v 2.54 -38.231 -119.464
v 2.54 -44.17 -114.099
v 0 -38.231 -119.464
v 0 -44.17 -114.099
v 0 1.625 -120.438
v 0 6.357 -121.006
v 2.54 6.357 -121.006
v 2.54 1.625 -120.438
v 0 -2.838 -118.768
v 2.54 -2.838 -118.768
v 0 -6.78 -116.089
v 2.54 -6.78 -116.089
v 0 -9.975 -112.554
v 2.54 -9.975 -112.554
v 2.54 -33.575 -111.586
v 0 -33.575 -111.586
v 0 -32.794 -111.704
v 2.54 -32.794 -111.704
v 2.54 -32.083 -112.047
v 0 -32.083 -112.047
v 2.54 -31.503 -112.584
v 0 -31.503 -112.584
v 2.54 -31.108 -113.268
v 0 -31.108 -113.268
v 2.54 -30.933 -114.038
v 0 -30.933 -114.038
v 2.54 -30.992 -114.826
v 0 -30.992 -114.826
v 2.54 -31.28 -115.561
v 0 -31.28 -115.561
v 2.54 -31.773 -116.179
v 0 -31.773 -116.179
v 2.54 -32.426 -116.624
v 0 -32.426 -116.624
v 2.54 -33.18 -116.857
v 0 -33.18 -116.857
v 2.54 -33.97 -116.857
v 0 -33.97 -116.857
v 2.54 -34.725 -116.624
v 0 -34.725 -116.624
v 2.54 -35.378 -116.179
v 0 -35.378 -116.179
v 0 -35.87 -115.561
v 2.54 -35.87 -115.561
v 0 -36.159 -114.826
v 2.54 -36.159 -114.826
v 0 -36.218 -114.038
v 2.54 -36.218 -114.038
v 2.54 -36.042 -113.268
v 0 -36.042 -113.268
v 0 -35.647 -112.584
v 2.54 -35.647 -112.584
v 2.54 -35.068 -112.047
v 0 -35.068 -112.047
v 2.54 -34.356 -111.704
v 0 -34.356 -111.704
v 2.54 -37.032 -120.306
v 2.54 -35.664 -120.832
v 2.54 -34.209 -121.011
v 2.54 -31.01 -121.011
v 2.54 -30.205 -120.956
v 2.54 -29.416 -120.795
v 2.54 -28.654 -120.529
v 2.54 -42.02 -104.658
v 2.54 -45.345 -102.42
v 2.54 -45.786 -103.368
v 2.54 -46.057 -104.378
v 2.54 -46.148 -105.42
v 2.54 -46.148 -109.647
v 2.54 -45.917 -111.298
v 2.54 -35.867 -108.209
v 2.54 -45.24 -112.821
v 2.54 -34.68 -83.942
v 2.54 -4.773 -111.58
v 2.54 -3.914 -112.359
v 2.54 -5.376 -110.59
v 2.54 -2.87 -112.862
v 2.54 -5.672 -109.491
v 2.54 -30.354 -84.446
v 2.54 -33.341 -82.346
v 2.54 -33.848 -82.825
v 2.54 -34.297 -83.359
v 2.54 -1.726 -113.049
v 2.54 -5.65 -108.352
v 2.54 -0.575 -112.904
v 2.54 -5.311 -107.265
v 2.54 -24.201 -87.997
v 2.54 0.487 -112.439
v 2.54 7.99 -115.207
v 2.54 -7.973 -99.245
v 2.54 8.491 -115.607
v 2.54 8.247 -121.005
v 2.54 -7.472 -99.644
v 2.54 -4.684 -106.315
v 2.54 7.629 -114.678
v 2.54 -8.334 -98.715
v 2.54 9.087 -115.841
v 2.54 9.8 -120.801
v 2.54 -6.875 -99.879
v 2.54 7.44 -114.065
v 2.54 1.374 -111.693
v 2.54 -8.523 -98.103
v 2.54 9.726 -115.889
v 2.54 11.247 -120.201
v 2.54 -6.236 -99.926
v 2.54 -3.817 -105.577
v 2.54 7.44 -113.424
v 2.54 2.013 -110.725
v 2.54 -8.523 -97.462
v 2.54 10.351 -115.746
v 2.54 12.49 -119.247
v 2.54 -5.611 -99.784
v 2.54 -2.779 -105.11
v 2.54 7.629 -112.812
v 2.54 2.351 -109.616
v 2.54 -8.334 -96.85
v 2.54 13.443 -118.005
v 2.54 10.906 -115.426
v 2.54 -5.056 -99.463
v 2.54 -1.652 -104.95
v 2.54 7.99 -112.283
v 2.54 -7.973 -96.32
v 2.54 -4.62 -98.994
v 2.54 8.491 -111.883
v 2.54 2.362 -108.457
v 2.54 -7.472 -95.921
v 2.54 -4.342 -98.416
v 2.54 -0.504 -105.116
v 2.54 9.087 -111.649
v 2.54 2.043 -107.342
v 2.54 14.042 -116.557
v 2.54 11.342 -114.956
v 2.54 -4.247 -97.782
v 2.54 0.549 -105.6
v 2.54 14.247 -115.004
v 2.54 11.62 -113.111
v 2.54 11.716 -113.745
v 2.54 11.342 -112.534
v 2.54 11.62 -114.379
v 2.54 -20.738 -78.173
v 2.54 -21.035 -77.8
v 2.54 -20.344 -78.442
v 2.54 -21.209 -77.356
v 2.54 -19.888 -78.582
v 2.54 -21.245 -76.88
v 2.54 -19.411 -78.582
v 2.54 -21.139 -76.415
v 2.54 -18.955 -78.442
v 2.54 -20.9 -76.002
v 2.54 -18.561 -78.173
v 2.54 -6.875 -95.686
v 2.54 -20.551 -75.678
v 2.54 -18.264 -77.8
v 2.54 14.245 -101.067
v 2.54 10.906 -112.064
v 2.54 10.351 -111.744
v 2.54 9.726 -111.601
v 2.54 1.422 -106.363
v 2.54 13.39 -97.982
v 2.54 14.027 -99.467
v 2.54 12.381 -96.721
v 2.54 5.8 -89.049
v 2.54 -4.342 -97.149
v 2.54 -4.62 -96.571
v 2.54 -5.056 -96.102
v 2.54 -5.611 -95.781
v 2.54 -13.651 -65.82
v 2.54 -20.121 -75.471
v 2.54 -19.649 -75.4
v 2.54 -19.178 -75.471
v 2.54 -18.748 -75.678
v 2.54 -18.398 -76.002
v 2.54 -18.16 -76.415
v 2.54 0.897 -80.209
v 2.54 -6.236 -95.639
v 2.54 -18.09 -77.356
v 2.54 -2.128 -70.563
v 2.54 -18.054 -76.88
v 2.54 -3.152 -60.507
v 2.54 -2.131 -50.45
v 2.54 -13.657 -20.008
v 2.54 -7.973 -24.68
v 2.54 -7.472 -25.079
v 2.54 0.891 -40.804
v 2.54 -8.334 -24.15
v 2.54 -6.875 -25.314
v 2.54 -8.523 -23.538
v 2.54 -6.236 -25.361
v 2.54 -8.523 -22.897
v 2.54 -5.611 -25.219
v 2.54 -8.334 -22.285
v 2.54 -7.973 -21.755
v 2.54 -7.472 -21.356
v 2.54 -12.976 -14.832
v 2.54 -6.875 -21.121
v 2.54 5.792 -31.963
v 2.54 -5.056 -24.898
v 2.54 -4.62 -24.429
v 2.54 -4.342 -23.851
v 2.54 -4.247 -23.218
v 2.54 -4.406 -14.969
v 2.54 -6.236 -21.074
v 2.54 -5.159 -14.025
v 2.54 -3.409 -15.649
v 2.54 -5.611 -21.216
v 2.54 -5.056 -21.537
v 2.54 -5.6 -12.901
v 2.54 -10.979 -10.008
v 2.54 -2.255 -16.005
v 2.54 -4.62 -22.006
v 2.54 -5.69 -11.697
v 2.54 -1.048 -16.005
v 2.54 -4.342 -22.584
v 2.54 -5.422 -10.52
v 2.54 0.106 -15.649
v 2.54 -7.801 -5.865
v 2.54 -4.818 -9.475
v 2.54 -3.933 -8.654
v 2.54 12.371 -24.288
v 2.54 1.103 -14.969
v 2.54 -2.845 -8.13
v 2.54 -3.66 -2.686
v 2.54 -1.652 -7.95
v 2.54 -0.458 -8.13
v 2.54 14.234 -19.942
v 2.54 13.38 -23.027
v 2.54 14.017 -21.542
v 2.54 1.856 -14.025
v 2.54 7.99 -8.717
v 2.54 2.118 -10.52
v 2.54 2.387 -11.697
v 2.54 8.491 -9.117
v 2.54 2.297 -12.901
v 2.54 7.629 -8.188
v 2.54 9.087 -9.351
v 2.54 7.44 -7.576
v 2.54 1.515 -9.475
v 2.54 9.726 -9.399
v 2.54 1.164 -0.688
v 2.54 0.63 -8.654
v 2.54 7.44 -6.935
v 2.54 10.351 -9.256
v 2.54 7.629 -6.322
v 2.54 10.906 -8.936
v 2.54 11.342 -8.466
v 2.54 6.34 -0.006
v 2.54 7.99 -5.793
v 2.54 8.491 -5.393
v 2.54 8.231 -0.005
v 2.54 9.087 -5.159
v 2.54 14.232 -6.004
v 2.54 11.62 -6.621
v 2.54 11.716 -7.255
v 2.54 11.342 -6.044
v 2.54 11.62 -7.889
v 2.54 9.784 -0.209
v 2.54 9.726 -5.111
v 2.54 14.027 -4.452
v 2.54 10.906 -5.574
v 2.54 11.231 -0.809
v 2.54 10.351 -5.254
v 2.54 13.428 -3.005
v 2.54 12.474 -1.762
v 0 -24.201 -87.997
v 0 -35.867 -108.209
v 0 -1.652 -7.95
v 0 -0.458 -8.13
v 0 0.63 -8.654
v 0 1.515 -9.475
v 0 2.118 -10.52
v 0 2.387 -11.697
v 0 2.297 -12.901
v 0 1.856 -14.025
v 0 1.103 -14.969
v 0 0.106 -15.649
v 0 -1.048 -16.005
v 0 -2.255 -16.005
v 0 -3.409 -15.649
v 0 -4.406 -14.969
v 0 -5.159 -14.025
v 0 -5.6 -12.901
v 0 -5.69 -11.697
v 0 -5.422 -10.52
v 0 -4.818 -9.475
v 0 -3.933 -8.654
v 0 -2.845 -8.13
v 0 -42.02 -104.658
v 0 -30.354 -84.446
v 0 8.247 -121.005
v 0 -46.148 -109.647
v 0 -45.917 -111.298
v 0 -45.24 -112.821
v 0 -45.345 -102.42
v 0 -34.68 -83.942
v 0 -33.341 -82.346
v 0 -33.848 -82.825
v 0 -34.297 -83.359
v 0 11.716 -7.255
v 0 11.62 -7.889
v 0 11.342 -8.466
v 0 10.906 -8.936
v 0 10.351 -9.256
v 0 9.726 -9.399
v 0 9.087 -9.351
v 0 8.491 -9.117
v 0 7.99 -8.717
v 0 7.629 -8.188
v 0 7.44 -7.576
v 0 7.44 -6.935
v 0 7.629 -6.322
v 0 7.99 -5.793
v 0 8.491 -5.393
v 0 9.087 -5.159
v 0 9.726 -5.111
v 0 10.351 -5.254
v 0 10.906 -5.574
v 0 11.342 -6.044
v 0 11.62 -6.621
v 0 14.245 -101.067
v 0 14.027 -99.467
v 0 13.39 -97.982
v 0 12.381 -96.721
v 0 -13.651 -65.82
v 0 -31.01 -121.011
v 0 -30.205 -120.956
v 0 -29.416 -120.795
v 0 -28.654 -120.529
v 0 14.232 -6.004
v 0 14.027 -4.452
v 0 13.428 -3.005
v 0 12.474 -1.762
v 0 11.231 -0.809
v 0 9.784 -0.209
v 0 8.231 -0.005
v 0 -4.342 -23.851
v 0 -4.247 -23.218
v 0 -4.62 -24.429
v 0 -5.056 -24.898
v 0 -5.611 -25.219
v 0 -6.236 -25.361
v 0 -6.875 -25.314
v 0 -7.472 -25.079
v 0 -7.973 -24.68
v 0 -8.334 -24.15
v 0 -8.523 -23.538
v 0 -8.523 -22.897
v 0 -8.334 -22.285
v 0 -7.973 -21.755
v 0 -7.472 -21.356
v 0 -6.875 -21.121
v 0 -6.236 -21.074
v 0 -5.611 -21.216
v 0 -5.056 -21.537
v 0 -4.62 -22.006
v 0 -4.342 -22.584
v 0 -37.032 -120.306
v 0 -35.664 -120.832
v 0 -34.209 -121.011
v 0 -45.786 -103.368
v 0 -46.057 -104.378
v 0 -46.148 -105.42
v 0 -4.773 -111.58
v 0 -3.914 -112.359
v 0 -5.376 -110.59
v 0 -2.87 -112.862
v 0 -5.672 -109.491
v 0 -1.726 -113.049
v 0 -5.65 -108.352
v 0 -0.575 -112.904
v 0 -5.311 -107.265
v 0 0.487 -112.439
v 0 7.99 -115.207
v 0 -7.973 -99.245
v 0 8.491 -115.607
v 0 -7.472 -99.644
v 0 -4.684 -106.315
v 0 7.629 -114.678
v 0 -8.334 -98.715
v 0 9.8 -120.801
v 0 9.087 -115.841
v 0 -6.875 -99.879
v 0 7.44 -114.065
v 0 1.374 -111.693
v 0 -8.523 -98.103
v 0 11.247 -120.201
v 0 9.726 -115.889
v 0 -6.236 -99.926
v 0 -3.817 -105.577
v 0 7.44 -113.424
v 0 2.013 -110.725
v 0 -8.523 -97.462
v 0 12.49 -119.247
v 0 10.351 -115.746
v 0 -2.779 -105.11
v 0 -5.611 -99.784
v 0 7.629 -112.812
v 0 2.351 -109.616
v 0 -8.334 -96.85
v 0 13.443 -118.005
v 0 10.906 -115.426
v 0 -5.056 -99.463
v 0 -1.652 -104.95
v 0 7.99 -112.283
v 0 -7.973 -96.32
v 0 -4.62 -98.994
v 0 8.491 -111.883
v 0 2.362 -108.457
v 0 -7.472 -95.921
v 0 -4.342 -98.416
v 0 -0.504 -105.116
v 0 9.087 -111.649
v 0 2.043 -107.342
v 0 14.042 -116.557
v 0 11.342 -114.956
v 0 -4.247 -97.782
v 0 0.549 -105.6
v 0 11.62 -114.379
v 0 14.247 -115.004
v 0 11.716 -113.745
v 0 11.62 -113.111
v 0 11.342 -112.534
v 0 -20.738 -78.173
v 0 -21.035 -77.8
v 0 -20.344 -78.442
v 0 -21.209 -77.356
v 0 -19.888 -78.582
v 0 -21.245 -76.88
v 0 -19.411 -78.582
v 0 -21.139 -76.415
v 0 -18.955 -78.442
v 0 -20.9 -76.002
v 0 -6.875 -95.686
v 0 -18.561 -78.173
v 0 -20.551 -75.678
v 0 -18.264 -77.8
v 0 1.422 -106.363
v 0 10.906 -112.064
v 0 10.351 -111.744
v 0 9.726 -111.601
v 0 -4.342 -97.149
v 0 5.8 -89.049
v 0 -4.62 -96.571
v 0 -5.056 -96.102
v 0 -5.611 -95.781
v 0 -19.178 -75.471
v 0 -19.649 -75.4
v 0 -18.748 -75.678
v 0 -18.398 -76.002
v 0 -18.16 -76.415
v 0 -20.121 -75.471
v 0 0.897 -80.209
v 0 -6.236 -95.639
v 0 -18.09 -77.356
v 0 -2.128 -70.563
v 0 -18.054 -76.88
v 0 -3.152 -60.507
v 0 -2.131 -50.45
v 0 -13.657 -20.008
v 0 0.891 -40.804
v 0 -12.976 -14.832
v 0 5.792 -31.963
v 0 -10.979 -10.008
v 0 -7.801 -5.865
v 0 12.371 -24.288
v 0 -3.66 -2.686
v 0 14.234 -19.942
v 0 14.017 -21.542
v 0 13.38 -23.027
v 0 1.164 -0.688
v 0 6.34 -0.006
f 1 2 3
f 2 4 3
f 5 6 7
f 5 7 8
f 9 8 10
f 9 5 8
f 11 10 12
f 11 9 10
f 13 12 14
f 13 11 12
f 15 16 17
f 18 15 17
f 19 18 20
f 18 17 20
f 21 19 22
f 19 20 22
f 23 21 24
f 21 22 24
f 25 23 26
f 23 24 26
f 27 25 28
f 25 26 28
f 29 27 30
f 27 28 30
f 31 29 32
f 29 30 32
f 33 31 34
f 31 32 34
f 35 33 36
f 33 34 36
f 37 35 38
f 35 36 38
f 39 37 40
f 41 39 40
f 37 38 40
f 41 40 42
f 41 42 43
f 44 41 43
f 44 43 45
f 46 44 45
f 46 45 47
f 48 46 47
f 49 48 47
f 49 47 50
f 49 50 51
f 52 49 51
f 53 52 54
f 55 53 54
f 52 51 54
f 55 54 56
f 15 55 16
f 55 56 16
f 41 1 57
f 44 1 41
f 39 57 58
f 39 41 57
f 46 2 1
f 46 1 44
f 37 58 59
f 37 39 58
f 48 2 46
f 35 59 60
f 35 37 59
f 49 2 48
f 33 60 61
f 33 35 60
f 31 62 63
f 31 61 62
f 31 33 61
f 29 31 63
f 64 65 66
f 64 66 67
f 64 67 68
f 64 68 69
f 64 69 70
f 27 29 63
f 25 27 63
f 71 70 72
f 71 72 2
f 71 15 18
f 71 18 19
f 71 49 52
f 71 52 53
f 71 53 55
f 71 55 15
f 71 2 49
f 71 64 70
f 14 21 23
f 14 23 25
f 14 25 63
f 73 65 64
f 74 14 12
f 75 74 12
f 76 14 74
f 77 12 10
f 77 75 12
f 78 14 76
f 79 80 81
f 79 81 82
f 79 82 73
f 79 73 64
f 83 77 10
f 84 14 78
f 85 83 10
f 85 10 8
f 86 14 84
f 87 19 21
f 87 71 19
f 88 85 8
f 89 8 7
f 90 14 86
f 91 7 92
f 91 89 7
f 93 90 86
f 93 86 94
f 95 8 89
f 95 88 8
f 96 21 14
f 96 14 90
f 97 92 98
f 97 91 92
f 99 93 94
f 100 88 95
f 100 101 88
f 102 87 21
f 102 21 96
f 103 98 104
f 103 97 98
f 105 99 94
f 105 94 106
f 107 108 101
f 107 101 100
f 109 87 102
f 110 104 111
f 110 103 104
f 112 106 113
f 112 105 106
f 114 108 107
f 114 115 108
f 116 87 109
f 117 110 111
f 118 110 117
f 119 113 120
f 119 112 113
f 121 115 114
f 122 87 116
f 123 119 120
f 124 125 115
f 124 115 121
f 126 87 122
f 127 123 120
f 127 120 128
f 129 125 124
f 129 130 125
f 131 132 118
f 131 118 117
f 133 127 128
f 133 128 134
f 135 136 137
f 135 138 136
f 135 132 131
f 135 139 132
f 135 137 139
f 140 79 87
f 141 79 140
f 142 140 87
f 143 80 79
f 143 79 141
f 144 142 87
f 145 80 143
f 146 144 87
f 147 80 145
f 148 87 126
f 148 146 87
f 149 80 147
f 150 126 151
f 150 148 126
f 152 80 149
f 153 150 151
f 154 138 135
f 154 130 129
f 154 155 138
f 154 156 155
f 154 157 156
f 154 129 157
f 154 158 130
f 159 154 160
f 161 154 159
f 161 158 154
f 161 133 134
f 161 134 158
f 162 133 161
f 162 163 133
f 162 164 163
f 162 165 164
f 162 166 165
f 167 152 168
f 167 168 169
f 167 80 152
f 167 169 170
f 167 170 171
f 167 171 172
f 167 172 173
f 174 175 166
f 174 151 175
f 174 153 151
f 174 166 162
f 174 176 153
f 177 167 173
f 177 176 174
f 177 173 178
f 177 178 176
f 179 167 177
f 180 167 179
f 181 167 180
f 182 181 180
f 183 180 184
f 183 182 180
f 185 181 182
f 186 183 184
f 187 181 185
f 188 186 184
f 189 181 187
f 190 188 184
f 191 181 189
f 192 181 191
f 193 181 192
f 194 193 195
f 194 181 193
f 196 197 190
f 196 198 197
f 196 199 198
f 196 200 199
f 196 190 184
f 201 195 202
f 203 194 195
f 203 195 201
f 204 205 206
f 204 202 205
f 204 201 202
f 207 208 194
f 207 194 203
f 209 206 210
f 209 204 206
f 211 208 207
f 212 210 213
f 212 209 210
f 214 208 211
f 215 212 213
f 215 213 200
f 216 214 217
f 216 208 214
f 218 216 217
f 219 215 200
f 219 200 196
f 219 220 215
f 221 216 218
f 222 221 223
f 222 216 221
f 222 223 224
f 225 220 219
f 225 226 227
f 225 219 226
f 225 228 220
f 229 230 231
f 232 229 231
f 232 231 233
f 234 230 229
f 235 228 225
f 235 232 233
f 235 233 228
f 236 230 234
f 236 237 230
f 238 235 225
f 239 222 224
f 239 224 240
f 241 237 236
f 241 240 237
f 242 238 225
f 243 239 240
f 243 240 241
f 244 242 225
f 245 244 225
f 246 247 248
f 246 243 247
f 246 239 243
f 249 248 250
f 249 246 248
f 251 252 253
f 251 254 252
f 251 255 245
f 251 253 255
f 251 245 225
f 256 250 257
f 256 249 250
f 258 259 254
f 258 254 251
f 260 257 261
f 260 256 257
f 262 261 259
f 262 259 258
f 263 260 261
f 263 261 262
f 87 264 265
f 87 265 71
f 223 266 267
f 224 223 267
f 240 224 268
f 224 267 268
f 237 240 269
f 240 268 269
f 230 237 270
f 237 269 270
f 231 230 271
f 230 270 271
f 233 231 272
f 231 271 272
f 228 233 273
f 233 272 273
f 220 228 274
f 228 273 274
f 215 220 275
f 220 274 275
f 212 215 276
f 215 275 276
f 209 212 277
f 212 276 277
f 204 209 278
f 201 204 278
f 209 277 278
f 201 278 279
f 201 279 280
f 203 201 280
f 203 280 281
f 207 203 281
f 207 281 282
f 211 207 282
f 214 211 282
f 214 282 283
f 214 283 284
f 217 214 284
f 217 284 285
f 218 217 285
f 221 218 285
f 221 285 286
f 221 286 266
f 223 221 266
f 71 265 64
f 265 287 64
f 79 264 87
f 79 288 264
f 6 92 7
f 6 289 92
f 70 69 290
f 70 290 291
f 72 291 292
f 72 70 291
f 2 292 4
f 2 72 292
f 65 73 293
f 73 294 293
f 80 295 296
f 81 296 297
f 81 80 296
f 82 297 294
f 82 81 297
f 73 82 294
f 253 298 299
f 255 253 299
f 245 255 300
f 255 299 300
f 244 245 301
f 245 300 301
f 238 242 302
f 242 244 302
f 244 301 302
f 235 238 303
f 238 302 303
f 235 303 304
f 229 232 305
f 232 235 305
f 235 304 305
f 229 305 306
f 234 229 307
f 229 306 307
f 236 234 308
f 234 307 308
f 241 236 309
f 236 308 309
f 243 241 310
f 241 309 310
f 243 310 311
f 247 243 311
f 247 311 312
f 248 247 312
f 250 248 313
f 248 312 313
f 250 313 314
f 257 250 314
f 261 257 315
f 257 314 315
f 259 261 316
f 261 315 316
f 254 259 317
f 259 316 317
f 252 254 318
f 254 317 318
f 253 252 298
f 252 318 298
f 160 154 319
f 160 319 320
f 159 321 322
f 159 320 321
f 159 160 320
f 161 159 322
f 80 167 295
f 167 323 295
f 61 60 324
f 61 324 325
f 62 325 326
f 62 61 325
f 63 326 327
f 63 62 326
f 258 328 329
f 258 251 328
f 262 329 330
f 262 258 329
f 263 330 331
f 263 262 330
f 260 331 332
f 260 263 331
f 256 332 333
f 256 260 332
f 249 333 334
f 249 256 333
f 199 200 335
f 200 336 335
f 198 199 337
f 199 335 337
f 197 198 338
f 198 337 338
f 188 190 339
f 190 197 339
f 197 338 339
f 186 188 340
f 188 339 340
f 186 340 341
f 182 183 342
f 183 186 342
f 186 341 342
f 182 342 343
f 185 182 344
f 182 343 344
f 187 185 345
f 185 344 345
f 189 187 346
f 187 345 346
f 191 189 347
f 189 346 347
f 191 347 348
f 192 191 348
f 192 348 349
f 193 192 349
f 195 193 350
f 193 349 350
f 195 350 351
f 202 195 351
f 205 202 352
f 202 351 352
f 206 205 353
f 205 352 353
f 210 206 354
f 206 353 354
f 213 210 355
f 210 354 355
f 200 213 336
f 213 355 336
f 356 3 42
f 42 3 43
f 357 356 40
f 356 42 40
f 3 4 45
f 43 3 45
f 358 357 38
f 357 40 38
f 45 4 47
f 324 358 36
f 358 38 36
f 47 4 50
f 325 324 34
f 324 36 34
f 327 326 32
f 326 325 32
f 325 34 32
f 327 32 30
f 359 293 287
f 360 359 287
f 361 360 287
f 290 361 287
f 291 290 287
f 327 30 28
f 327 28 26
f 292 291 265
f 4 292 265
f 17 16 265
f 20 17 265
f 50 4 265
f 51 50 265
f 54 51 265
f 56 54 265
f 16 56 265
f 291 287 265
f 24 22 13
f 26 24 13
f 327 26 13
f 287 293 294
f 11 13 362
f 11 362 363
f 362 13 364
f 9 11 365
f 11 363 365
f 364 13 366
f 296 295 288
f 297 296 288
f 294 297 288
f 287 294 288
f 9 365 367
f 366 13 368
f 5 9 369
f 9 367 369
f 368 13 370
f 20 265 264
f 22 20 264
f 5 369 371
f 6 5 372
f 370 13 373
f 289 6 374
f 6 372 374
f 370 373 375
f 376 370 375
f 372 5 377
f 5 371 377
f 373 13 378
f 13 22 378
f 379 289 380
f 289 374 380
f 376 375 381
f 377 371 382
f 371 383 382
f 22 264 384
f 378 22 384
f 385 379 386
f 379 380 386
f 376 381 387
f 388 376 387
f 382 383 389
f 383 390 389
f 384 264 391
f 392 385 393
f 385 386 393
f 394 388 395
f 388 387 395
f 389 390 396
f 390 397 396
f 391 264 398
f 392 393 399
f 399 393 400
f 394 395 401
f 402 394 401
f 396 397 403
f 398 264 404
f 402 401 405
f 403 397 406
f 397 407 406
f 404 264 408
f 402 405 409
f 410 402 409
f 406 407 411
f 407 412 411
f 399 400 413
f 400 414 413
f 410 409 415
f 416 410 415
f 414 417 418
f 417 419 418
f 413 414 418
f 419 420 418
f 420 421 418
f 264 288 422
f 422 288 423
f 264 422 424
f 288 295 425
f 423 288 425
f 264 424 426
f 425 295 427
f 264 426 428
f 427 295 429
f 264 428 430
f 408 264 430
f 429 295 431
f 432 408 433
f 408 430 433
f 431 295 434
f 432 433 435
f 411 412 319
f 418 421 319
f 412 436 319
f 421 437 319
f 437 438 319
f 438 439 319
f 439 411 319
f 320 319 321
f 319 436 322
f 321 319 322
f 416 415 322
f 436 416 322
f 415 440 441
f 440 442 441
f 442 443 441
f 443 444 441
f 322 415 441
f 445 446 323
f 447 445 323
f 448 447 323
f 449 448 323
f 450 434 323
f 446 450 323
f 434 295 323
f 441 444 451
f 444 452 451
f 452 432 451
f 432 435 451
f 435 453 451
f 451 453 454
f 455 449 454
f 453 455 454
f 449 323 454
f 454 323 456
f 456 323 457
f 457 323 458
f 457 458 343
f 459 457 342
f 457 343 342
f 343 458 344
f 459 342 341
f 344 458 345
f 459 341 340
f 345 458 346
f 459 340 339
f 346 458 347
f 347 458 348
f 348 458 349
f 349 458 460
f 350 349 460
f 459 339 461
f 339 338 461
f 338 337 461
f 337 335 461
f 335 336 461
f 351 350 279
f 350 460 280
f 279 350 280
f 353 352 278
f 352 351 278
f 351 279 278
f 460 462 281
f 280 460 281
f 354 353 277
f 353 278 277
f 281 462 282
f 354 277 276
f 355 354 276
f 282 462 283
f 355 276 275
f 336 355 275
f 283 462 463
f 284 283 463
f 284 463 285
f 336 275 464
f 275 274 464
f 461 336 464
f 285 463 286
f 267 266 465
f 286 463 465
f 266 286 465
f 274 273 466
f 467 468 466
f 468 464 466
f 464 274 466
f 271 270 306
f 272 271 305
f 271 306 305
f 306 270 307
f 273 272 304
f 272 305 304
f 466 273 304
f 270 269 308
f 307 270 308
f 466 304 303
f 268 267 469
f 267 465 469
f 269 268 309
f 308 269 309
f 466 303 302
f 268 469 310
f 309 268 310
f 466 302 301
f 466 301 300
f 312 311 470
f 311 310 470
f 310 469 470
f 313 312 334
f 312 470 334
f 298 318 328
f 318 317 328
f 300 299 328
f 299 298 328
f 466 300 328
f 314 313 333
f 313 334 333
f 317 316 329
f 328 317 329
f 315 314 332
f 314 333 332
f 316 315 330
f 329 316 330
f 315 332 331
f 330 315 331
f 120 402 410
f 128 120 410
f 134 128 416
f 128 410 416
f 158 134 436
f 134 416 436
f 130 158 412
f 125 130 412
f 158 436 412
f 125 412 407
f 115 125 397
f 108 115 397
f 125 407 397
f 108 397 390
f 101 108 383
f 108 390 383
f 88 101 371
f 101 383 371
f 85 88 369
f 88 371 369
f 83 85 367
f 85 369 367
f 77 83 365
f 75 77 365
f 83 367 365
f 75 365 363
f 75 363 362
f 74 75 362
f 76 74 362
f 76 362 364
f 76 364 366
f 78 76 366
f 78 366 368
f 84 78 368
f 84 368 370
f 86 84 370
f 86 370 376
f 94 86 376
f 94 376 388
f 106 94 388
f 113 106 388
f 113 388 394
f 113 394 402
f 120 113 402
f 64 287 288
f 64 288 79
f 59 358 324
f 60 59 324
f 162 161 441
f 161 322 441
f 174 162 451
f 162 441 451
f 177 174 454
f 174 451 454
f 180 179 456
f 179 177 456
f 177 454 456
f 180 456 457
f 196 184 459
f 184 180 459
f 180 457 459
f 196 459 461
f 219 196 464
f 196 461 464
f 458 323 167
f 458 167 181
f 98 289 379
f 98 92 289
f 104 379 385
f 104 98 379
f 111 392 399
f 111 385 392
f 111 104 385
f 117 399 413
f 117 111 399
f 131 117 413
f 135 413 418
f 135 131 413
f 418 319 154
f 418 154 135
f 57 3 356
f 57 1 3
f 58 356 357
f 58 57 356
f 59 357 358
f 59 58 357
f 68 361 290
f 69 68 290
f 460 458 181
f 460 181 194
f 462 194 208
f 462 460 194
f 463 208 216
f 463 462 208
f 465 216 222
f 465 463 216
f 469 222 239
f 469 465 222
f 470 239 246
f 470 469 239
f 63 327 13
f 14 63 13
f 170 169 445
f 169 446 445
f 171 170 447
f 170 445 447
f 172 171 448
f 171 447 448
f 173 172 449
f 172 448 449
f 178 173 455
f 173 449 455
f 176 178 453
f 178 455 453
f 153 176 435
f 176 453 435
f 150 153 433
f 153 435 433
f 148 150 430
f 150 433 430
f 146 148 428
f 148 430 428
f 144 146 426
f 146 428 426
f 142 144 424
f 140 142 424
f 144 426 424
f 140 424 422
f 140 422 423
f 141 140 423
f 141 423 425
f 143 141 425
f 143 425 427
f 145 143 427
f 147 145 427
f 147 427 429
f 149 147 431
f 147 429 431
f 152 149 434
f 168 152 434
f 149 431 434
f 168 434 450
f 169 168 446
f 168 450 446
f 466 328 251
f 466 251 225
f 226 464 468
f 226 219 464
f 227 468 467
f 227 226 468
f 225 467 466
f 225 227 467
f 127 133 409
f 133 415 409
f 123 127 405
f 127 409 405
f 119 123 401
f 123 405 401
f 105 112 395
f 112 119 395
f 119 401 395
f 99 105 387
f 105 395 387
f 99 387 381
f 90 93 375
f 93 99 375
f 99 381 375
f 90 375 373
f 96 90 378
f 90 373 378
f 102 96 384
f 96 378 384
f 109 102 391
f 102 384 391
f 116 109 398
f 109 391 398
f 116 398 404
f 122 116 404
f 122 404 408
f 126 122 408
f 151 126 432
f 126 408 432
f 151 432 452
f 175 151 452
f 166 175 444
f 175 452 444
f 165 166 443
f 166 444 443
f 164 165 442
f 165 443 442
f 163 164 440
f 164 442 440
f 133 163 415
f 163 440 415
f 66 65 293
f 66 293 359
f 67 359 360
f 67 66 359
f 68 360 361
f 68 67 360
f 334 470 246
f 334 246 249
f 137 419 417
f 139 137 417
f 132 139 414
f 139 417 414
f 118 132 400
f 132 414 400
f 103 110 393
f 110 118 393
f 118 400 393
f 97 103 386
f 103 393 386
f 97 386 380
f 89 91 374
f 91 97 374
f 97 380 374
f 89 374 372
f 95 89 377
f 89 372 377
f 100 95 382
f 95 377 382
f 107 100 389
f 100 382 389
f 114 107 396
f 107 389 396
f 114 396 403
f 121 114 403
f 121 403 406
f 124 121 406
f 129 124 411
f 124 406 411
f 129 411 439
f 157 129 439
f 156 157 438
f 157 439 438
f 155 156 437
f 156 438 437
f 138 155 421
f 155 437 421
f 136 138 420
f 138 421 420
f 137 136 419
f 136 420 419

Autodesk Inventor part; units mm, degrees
ref_plane "YZ Plane" through (0, 0, 0) normal (1, 0, 0) x (0, 1, 0)
ref_plane "XZ Plane" through (0, 0, 0) normal (0, 1, 0) x (-1, 0, 0)
sketch "Sketch1" plane through (0, 0, 0) normal (1, 0, 0) x (0, 1, 0)
  line L0 (14.231, -0.0045) -> (14.2475, -121.0044)
  circle A0 centre (46.8483, -60.5) radius 44 projected
  arc A1 (-10.6283, -58.8604) -> (-0.114, -93.6782) centre (46.8483, -60.5) ccw projected
  line L1 (-0.114, -93.6782) -> (2.9975, -94.9709) projected
  arc A2 (2.9975, -94.9709) -> (7.0992, -99.6298) centre (46.8483, -60.5) ccw projected
  line L2 (7.0992, -99.6298) -> (13.2859, -93.5395) projected
  arc A3 (-0.2275, -59.1156) -> (13.2859, -93.5395) centre (46.8483, -60.5) ccw projected
  line L3 (-0.2275, -59.1156) -> (-8.9052, -58.8604) projected
  line L4 (-8.9052, -58.8604) -> (-10.6283, -58.8604) projected
  circle A4 centre (84.1308, -7.2551) radius 2.15 projected
  circle A5 centre (95.3483, -109) radius 2.65 projected
  circle A6 centre (100.0932, -97.7825) radius 2.15 projected
  circle A7 centre (-6.3966, -23.2175) radius 2.15 projected
  circle A8 centre (-6.3966, -97.7825) radius 2.15 projected
  circle A9 centre (-1.6517, -12) radius 2.65 projected
  circle A10 centre (95.3483, -12) radius 2.65 projected
  circle A11 centre (9.5658, -113.7449) radius 2.15 projected
  circle A12 centre (9.5658, -7.2551) radius 2.15 projected
  circle A13 centre (84.1308, -113.7449) radius 2.15 projected
  circle A14 centre (100.0932, -23.2175) radius 2.15 projected
  circle A15 centre (-1.6517, -109) radius 2.65 projected
  line L5 (-7.7476, -49.0794) -> (0.7499, -50.8569) projected
  arc A16 (12.1591, -28.6456) -> (0.7499, -50.8569) centre (46.8483, -60.5) ccw projected
  line L6 (12.1591, -28.6456) -> (5.7646, -22.7737) projected
  arc A17 (5.7646, -22.7737) -> (-7.7476, -49.0794) centre (46.8483, -60.5) ccw projected
  line L7 (83.7453, -102.33) -> (78.0025, -95.8194) projected
  arc A18 (66.2911, -103.3955) -> (78.0025, -95.8194) centre (46.8483, -60.5) ccw projected
  line L8 (66.2911, -103.3955) -> (69.8751, -111.3026) projected
  arc A19 (69.8751, -111.3026) -> (83.7453, -102.33) centre (46.8483, -60.5) ccw projected
  line L9 (85.3896, -20.1799) -> (79.3909, -26.4555) projected
  arc A20 (89.1056, -39.7066) -> (79.3909, -26.4555) centre (46.8483, -60.5) ccw projected
  line L10 (89.1056, -39.7066) -> (96.8951, -35.8737) projected
  arc A21 (96.8951, -35.8737) -> (85.3896, -20.1799) centre (46.8483, -60.5) ccw projected
  line L11 (58.0786, -115.1353) -> (56.3307, -106.6317) projected
  arc A22 (42.4628, -107.3915) -> (56.3307, -106.6317) centre (46.8483, -60.5) ccw projected
  line L12 (42.4628, -107.3915) -> (41.6544, -116.0352) projected
  arc A23 (41.6544, -116.0352) -> (58.0786, -115.1353) centre (46.8483, -60.5) ccw projected
  line L13 (11.1274, -17.6613) -> (16.6872, -24.3288) projected
  arc A24 (31.0571, -16.1301) -> (16.6872, -24.3288) centre (46.8483, -60.5) ccw projected
  line L14 (31.0571, -16.1301) -> (28.1463, -7.9512) projected
  arc A25 (28.1463, -7.9512) -> (11.1274, -17.6613) centre (46.8483, -60.5) ccw projected
  line L15 (101.6271, -71.0083) -> (93.1011, -69.3728) projected
  arc A26 (82.2782, -91.5285) -> (93.1011, -69.3728) centre (46.8483, -60.5) ccw projected
  line L16 (82.2782, -91.5285) -> (88.8092, -97.2481) projected
  arc A27 (88.8092, -97.2481) -> (101.6271, -71.0083) centre (46.8483, -60.5) ccw projected
  line L17 (100.5451, -45.4072) -> (92.1875, -47.7563) projected
  arc A28 (93.8596, -63.3257) -> (92.1875, -47.7563) centre (46.8483, -60.5) ccw projected
  line L18 (93.8596, -63.3257) -> (102.5254, -63.8466) projected
  arc A29 (102.5254, -63.8466) -> (100.5451, -45.4072) centre (46.8483, -60.5) ccw projected
  line L19 (38.2646, -115.6131) -> (39.6006, -107.0351) projected
  arc A30 (20.5997, -99.6032) -> (39.6006, -107.0351) centre (46.8483, -60.5) ccw projected
  line L20 (20.5997, -99.6032) -> (15.7612, -106.8113) projected
  arc A31 (15.7612, -106.8113) -> (38.2646, -115.6131) centre (46.8483, -60.5) ccw projected
  line L21 (38.8508, -5.2987) -> (40.0955, -13.8905) projected
  arc A32 (56.4914, -14.4016) -> (40.0955, -13.8905) centre (46.8483, -60.5) ccw projected
  line L22 (56.4914, -14.4016) -> (58.2689, -5.9041) projected
  arc A33 (58.2689, -5.9041) -> (38.8508, -5.2987) centre (46.8483, -60.5) ccw projected
  arc A34 (6.34, -0.0055) -> (-13.6572, -20.0083) centre (6.3428, -20.0055) ccw projected
  line L23 (6.34, -0.0055) -> (87.34, 0.0055) projected
  arc A35 (107.3428, -19.9917) -> (87.34, 0.0055) centre (87.3428, -19.9945) ccw projected
  line L24 (107.3428, -19.9917) -> (107.3538, -100.9917) projected
  arc A36 (87.3566, -120.9945) -> (107.3538, -100.9917) centre (87.3538, -100.9945) ccw projected
  line L25 (87.3566, -120.9945) -> (6.3566, -121.0055) projected
  arc A37 (-13.6462, -101.0083) -> (6.3566, -121.0055) centre (6.3538, -101.0055) ccw projected
  line L26 (-13.6462, -101.0083) -> (-13.6572, -20.0083) projected
  line L27 (-13.651, -65.8198) -> (-34.151, -83.0261)
  line L28 (-34.151, -83.0261) -> (-46.1481, -103.8124)
  line L29 (-46.1481, -103.8124) -> (-46.1481, -112.3124)
  line L30 (-46.1481, -112.3124) -> (-36.5178, -121.0114)
  line L31 (-36.5178, -121.0114) -> (-13.6462, -101.0083)
  circle A38 centre (46.8483, -60.5) radius 50
  circle A39 centre (-1.6517, -109) radius 5.75 projected
  line L32 (-69.3325, -76.5758) -> (-2.1613, -115.3449)
  line L33 (-36.5178, -121.0114) -> (-29.7828, -121.0105)
  line L34 (-29.7828, -121.0105) -> (-1.6517, -109)
  point P0 (0, 0)
  point P1 (14.2445, -98.4076)
  point P2 (14.2341, -22.6013)
  point P3 (-9.9753, -112.5537)
  dimension "d4" = 100
  dimension "d5" = 60
  dimension "d6" = 90
  dimension "d7" = 12
  dimension "d8" = 12
  dimension "d26" = 8.5
  dimension "d27" = 20.5
  dimension "d29" = 0
  dimension "d36" = 50
extrude "Extrusion1" add sketch "Sketch1" along normal blind 2.54 contours L34 A39 L32 | L0 A25 L13 A38 L6 A17 L5 L3 L4 A1 L1 A2 L2 L25 A37 L34 L32 L26 A34 L23 | L0 L13 A25 | L26 L31 L32 L28 L27 | A38 L5 A17 L6 | A37 L32 L31 | L32 L34 A37 | A37 L34 L33 L31 L32 | L31 L30 L29 L28 L32 | A38 L2 A2 L1 A1 L4 L3 | A39
fillet "Fillet1" radius 6 4 edges at (1.27, 14.231, -0.0045) (1.27, 14.2475, -121.0044) (1.27, 14.2445, -98.4076) (1.27, 14.2341, -22.6013)
sketch "Sketch3" plane through (0, 0, 0) normal (-1, 0, 0) x (0, 0, 1)
  circle A0 centre (-12, -1.6517) radius 2.65 projected
  circle A1 centre (-12, -1.6517) radius 4.05
  circle A2 centre (-109, -1.6517) radius 2.65 projected
  circle A3 centre (-109, -1.6517) radius 4.05
  point P0 (0, 0)
  dimension "d13" = 8.1
  dimension "d14" = 8.1
extrude "Extrusion3" cut sketch "Sketch3" against normal through all contours A0 | A1 | A2 | A3
ref_plane "Work Plane2" through (0, -42.6838, -105.8119) normal (0, -0.8661, 0.4999) x (1, 0, 0)
sketch "Sketch4" plane through (0, -42.6838, -105.8119) normal (0, -0.8661, 0.4999) x (1, 0, 0)
  circle A0 centre (-17.46, 13) radius 21
  line L0 (0, 24) -> (0, 0) projected
  line L1 (0, 24) -> (2.54, 24) projected
  line L2 (0, 49.1499) -> (0, 24) projected
  line L3 (0, 0) -> (0, -7.3618) projected
  line L4 (0, 1.3317) -> (3.4521, 1.3317)
  line L5 (3.4521, 1.3317) -> (7.9852, 19.2714)
  line L6 (0, 24.6683) -> (6.7025, 24.6683)
  line L7 (6.7025, 24.6683) -> (7.9852, 19.2714)
  line L8 (0, 13.7) -> (2.54, 13.7) projected
  line L9 (0, 11.3553) -> (2.54, 11.3553) projected
  line L10 (0, 11.3553) -> (0, 30.1698)
  point P0 (0, 112.9799)
  point P1 (0.4285, 24)
  point P2 (0, 24.6683)
  dimension "d18" = 42
  dimension "d19" = 17.46
  dimension "d30" = 0.7
extrude "Extrusion4" cut sketch "Sketch4" against normal blind 7.1 contours L6 L7 L5 L4 A0 | A0 L1 L2 | L0 L1 A0
sketch "Sketch5" plane through (0, 0, 0) normal (-1, 0, 0) x (0, 0, 1)
  circle A0 centre (-114.2363, -33.5753) radius 2.65
  line L0 (-112.3124, -46.1481) -> (-121.0114, -36.5178) projected
  line L1 (-108.2077, -35.8688) -> (-87.996, -24.2033) projected
  point P0 (0, 0)
  point P1 (-88.5749, -24.5372)
  dimension "d23" = 5.3
  dimension "d24" = 7
  dimension "d25" = 5
extrude "Extrusion5" cut sketch "Sketch5" against normal through all
sketch "Sketch6" plane through (0, 0, 0) normal (-1, 0, 0) x (0, 0, 1)
  circle A0 centre (-77, -19.6494) radius 1.6
  line L0 (-20.0083, -13.6572) -> (-65.8198, -13.651) projected
  circle A1 centre (-109, -1.6517) radius 4.05 projected
  point P0 (0, 0)
  dimension "d33" = 3.2
  dimension "d34" = 6
  dimension "d35" = 32
extrude "Extrusion6" cut sketch "Sketch6" against normal through all contours A0
fillet "Fillet2" radius 6 5 edges at (1.27, -34.151, -83.0261) (1.27, -46.1481, -103.8124) (1.27, -46.1481, -112.3124) (1.27, -36.5178, -121.0114) (1.27, -29.7828, -121.0105)
properties part number "output_support"
